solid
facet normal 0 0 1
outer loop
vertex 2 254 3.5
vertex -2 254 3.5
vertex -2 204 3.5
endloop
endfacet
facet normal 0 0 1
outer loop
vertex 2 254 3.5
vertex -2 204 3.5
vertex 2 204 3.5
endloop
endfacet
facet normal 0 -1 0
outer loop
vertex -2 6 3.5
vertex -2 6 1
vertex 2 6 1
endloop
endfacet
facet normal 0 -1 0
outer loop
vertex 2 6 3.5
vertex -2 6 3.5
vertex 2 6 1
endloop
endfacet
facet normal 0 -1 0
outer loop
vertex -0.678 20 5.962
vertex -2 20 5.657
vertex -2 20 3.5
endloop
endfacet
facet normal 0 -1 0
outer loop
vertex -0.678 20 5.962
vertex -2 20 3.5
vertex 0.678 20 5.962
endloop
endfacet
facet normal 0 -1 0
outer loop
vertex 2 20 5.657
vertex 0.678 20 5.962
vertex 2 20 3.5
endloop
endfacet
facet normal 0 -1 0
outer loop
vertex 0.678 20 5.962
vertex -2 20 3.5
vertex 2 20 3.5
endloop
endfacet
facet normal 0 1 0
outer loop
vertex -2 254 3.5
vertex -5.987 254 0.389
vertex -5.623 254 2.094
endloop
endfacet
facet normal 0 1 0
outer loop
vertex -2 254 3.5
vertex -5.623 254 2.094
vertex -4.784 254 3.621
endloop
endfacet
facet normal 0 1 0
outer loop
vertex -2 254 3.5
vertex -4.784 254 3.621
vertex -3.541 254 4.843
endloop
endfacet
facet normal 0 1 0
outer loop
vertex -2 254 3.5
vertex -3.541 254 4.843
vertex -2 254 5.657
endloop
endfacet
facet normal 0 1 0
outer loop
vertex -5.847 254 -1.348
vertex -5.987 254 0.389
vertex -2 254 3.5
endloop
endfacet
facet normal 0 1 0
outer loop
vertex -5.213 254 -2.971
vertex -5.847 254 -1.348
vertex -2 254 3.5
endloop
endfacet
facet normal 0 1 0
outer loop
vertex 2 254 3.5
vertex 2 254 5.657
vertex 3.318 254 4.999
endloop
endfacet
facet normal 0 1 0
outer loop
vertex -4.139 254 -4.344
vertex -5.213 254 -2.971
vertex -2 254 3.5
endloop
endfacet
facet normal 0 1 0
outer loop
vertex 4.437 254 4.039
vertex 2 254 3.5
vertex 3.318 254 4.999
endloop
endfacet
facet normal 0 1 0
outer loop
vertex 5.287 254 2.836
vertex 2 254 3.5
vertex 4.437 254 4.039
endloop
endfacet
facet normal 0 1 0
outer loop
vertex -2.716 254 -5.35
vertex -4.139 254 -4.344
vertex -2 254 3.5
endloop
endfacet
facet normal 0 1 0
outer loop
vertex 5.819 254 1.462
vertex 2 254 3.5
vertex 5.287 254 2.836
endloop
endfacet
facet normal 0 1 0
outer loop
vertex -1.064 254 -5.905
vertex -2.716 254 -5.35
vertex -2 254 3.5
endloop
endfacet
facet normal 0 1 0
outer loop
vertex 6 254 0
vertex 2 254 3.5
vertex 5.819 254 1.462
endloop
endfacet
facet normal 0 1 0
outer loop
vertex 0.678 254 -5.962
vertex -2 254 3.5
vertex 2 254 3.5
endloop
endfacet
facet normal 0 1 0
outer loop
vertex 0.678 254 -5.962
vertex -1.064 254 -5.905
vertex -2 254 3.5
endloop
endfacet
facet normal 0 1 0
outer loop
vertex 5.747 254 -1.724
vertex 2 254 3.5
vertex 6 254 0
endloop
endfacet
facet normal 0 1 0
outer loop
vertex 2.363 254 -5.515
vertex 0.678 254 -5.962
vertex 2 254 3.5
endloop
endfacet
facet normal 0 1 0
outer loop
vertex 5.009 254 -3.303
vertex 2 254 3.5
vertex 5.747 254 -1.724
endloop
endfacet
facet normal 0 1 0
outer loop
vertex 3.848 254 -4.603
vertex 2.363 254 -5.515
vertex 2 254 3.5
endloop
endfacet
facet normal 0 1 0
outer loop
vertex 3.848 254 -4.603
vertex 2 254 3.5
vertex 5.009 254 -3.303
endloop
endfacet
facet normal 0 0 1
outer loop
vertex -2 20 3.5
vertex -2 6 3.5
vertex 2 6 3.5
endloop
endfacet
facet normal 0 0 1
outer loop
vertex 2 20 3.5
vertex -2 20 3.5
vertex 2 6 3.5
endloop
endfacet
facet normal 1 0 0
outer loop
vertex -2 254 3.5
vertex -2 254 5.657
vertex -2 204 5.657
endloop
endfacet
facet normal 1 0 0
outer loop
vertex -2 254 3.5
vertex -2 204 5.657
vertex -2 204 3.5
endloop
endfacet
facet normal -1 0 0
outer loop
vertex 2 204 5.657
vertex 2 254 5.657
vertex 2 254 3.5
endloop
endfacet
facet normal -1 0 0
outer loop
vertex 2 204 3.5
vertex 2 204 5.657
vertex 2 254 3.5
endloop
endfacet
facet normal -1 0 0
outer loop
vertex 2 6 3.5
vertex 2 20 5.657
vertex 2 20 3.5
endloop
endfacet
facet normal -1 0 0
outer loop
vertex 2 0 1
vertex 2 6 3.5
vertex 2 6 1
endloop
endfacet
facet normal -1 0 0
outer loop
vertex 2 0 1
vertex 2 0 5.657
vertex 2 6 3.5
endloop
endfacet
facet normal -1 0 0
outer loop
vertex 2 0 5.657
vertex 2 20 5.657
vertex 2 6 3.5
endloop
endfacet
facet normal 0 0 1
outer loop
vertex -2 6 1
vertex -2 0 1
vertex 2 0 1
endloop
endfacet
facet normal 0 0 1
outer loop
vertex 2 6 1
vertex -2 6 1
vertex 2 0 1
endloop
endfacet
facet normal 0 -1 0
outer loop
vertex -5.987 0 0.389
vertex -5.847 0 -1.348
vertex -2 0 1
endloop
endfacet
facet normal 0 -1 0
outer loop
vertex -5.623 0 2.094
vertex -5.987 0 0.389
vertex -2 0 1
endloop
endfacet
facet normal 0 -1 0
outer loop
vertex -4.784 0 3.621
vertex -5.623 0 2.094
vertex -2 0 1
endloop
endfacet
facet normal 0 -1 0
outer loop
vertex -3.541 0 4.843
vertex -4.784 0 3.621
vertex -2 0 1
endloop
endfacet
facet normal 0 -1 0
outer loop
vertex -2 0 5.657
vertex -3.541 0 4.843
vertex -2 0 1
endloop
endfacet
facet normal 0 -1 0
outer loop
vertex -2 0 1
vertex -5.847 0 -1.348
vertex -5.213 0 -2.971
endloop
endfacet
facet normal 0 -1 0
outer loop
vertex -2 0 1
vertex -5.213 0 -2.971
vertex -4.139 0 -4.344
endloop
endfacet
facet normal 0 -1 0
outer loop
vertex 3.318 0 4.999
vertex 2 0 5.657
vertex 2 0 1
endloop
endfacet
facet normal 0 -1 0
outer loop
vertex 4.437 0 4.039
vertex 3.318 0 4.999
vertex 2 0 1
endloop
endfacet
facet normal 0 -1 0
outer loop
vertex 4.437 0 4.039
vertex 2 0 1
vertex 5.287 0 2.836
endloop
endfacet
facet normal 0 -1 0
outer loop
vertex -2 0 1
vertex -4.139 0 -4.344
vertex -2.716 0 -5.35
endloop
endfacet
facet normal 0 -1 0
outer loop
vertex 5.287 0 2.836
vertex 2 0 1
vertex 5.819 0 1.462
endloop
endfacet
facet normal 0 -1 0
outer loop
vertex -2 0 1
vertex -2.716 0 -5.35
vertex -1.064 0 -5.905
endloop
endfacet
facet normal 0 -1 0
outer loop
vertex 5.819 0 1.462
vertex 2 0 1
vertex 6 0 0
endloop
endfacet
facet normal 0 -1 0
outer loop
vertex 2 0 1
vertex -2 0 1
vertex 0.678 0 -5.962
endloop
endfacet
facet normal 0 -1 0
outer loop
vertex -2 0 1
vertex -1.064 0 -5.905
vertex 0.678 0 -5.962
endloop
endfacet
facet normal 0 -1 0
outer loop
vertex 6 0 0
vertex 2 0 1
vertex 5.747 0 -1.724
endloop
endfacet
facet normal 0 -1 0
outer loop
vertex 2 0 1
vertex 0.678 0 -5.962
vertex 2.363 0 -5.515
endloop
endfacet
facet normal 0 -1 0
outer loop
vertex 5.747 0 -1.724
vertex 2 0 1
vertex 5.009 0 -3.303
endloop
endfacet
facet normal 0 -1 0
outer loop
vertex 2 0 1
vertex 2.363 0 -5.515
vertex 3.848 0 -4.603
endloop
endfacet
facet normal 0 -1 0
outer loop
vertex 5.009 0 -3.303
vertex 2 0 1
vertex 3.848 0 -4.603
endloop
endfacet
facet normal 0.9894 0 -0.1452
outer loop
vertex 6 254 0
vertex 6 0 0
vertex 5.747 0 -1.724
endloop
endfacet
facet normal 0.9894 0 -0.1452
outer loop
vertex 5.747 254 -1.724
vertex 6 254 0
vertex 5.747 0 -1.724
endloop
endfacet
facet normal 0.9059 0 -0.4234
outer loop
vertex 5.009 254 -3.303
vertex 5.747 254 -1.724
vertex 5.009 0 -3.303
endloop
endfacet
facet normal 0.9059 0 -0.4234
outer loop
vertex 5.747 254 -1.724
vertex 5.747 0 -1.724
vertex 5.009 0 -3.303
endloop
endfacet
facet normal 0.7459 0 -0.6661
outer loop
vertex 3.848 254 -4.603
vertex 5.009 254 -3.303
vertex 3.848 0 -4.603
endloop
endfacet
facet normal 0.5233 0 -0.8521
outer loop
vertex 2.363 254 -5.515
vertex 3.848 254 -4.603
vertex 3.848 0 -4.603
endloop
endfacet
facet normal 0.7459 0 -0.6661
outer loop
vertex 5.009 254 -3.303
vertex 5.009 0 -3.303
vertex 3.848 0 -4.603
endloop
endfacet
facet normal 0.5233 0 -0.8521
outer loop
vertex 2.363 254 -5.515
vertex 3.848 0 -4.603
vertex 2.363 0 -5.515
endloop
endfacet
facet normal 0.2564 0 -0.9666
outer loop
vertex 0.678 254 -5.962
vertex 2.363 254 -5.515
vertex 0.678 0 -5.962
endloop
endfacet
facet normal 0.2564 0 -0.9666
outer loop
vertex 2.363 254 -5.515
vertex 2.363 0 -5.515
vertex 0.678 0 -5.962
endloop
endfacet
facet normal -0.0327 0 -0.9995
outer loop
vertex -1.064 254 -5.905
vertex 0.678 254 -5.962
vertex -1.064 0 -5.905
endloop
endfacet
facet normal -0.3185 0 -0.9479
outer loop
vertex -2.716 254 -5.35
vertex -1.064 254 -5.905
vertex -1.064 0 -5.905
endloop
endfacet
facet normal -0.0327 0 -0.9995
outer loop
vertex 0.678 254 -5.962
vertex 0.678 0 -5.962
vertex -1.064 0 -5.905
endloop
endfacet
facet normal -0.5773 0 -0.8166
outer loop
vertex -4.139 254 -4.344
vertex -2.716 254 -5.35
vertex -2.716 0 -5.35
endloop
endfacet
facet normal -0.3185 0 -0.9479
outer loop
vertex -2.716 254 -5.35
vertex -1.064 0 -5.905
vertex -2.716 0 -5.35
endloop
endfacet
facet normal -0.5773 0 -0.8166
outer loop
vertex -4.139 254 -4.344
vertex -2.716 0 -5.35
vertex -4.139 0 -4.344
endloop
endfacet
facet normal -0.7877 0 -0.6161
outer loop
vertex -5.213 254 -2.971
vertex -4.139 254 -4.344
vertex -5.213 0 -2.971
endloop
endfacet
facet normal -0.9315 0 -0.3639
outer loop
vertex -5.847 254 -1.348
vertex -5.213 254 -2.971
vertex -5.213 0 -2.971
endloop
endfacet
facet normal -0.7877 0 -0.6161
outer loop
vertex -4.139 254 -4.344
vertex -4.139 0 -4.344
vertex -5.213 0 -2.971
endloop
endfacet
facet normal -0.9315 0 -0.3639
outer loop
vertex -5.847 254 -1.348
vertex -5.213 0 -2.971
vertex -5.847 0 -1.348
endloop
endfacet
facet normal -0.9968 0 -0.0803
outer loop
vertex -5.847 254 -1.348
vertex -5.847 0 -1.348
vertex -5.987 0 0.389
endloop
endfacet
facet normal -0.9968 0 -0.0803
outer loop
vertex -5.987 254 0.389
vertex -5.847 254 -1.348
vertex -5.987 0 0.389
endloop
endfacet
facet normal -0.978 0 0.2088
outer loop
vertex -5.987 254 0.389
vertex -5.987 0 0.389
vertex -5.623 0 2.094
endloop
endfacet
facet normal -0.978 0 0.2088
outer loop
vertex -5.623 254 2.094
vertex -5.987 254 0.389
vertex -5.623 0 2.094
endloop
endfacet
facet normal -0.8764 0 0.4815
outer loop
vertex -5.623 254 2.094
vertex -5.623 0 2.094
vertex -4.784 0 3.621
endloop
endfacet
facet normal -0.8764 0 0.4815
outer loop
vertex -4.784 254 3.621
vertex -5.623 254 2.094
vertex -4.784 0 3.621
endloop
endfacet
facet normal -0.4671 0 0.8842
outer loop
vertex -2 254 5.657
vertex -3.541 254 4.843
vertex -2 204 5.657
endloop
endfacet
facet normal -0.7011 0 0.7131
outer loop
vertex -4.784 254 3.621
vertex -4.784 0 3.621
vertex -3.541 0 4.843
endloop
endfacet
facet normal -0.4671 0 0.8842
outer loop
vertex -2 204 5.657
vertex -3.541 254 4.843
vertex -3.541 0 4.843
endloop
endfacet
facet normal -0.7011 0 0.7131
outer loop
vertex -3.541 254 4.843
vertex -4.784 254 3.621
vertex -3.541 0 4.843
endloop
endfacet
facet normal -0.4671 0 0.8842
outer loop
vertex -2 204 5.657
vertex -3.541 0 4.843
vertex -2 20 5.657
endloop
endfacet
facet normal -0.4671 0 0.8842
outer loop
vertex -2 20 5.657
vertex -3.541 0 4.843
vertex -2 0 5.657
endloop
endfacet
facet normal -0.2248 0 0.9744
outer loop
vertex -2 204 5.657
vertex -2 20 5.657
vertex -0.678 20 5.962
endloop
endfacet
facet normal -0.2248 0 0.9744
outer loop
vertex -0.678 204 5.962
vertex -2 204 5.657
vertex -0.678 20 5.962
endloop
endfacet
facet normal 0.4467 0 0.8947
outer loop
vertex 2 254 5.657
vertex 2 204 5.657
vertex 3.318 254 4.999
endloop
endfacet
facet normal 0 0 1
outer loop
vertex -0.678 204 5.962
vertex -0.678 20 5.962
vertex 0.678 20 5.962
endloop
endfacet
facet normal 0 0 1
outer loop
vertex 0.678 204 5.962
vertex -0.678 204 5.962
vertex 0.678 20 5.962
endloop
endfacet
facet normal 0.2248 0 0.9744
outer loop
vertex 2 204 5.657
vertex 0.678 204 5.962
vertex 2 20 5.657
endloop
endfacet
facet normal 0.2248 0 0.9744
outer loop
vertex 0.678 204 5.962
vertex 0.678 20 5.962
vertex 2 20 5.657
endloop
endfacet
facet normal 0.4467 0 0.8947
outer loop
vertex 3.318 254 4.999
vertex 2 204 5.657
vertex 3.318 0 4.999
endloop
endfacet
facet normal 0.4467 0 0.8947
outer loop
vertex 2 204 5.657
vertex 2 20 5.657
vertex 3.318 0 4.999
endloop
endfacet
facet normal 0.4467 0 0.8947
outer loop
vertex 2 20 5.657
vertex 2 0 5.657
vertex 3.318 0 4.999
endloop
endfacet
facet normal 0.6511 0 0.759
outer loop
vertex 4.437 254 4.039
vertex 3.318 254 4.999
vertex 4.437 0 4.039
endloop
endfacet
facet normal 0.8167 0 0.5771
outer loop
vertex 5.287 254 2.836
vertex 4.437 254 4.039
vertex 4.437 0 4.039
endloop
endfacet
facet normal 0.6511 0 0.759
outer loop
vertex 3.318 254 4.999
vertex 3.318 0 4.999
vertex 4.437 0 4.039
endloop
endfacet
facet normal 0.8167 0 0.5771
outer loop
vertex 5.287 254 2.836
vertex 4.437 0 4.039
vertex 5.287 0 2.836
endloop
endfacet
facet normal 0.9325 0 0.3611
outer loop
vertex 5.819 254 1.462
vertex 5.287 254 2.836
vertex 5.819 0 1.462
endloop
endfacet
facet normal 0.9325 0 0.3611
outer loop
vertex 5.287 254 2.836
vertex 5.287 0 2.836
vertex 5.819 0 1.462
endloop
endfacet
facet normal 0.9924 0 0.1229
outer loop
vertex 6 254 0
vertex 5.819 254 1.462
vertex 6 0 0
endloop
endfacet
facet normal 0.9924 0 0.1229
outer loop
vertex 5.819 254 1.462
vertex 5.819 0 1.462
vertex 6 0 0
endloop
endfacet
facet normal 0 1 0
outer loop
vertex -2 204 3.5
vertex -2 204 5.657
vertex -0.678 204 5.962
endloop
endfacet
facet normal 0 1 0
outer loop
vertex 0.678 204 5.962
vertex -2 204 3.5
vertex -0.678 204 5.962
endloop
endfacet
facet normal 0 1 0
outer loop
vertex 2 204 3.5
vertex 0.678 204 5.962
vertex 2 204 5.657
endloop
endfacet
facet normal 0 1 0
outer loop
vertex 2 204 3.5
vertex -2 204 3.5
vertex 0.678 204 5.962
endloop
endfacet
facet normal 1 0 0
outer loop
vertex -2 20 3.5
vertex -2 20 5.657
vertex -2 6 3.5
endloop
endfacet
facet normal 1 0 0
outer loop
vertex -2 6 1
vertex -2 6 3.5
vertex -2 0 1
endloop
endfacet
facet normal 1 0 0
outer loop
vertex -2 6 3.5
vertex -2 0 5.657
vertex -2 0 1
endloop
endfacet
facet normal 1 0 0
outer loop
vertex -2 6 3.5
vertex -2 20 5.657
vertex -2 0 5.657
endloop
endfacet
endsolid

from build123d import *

# Parameters (mm, degrees)
SKETCH1_R               = 6
BOSS_EXTRUDE1_DEPTH     = 254
SKETCH2_W               = 4
SKETCH2_H               = 5
CUT_EXTRUDE3_DEPTH      = 20
CUT_EXTRUDE3_DEPTH_BACK = 0.0001
CUT_EXTRUDE4_START      = 254
SKETCH2_2_W             = 4
SKETCH2_2_H             = 5
CUT_EXTRUDE4_DEPTH      = 50
SKETCH3_W               = 4
SKETCH3_H               = 10
CUT_EXTRUDE6_DEPTH      = 6


with BuildPart() as part:
    # Sketch1 → Boss-Extrude1 (new body)
    with BuildSketch(Plane(origin=(0, 0, 0), x_dir=(1, 0, 0), z_dir=(0, 1, 0))):
        Circle(SKETCH1_R)
    extrude(amount=BOSS_EXTRUDE1_DEPTH)

    # Sketch2 → Cut-Extrude3 (cut, two sides)
    with BuildSketch(Plane(origin=(0, 0, 0), x_dir=(1, 0, 0), z_dir=(0, 1, 0))) as cut_extrude3_sk:
        with Locations((0, -6)):
            Rectangle(SKETCH2_W, SKETCH2_H)
    extrude(amount=CUT_EXTRUDE3_DEPTH, mode=Mode.SUBTRACT)
    extrude(cut_extrude3_sk.sketch, amount=-CUT_EXTRUDE3_DEPTH_BACK, mode=Mode.SUBTRACT)

    # Sketch2<2> → Cut-Extrude4 (cut)
    with BuildSketch(Plane(origin=(0, 0, 0), x_dir=(1, 0, 0), z_dir=(0, 1, 0)).offset(CUT_EXTRUDE4_START)):
        with Locations((0, -6)):
            Rectangle(SKETCH2_2_W, SKETCH2_2_H)
    extrude(amount=-CUT_EXTRUDE4_DEPTH, mode=Mode.SUBTRACT)

    # Sketch3 → Cut-Extrude6 (cut)
    with BuildSketch(Plane(origin=(0, 0, 0), x_dir=(1, 0, 0), z_dir=(0, 1, 0))):
        with Locations((0, -6)):
            Rectangle(SKETCH3_W, SKETCH3_H)
    extrude(amount=CUT_EXTRUDE6_DEPTH, mode=Mode.SUBTRACT)


solid = part.part
